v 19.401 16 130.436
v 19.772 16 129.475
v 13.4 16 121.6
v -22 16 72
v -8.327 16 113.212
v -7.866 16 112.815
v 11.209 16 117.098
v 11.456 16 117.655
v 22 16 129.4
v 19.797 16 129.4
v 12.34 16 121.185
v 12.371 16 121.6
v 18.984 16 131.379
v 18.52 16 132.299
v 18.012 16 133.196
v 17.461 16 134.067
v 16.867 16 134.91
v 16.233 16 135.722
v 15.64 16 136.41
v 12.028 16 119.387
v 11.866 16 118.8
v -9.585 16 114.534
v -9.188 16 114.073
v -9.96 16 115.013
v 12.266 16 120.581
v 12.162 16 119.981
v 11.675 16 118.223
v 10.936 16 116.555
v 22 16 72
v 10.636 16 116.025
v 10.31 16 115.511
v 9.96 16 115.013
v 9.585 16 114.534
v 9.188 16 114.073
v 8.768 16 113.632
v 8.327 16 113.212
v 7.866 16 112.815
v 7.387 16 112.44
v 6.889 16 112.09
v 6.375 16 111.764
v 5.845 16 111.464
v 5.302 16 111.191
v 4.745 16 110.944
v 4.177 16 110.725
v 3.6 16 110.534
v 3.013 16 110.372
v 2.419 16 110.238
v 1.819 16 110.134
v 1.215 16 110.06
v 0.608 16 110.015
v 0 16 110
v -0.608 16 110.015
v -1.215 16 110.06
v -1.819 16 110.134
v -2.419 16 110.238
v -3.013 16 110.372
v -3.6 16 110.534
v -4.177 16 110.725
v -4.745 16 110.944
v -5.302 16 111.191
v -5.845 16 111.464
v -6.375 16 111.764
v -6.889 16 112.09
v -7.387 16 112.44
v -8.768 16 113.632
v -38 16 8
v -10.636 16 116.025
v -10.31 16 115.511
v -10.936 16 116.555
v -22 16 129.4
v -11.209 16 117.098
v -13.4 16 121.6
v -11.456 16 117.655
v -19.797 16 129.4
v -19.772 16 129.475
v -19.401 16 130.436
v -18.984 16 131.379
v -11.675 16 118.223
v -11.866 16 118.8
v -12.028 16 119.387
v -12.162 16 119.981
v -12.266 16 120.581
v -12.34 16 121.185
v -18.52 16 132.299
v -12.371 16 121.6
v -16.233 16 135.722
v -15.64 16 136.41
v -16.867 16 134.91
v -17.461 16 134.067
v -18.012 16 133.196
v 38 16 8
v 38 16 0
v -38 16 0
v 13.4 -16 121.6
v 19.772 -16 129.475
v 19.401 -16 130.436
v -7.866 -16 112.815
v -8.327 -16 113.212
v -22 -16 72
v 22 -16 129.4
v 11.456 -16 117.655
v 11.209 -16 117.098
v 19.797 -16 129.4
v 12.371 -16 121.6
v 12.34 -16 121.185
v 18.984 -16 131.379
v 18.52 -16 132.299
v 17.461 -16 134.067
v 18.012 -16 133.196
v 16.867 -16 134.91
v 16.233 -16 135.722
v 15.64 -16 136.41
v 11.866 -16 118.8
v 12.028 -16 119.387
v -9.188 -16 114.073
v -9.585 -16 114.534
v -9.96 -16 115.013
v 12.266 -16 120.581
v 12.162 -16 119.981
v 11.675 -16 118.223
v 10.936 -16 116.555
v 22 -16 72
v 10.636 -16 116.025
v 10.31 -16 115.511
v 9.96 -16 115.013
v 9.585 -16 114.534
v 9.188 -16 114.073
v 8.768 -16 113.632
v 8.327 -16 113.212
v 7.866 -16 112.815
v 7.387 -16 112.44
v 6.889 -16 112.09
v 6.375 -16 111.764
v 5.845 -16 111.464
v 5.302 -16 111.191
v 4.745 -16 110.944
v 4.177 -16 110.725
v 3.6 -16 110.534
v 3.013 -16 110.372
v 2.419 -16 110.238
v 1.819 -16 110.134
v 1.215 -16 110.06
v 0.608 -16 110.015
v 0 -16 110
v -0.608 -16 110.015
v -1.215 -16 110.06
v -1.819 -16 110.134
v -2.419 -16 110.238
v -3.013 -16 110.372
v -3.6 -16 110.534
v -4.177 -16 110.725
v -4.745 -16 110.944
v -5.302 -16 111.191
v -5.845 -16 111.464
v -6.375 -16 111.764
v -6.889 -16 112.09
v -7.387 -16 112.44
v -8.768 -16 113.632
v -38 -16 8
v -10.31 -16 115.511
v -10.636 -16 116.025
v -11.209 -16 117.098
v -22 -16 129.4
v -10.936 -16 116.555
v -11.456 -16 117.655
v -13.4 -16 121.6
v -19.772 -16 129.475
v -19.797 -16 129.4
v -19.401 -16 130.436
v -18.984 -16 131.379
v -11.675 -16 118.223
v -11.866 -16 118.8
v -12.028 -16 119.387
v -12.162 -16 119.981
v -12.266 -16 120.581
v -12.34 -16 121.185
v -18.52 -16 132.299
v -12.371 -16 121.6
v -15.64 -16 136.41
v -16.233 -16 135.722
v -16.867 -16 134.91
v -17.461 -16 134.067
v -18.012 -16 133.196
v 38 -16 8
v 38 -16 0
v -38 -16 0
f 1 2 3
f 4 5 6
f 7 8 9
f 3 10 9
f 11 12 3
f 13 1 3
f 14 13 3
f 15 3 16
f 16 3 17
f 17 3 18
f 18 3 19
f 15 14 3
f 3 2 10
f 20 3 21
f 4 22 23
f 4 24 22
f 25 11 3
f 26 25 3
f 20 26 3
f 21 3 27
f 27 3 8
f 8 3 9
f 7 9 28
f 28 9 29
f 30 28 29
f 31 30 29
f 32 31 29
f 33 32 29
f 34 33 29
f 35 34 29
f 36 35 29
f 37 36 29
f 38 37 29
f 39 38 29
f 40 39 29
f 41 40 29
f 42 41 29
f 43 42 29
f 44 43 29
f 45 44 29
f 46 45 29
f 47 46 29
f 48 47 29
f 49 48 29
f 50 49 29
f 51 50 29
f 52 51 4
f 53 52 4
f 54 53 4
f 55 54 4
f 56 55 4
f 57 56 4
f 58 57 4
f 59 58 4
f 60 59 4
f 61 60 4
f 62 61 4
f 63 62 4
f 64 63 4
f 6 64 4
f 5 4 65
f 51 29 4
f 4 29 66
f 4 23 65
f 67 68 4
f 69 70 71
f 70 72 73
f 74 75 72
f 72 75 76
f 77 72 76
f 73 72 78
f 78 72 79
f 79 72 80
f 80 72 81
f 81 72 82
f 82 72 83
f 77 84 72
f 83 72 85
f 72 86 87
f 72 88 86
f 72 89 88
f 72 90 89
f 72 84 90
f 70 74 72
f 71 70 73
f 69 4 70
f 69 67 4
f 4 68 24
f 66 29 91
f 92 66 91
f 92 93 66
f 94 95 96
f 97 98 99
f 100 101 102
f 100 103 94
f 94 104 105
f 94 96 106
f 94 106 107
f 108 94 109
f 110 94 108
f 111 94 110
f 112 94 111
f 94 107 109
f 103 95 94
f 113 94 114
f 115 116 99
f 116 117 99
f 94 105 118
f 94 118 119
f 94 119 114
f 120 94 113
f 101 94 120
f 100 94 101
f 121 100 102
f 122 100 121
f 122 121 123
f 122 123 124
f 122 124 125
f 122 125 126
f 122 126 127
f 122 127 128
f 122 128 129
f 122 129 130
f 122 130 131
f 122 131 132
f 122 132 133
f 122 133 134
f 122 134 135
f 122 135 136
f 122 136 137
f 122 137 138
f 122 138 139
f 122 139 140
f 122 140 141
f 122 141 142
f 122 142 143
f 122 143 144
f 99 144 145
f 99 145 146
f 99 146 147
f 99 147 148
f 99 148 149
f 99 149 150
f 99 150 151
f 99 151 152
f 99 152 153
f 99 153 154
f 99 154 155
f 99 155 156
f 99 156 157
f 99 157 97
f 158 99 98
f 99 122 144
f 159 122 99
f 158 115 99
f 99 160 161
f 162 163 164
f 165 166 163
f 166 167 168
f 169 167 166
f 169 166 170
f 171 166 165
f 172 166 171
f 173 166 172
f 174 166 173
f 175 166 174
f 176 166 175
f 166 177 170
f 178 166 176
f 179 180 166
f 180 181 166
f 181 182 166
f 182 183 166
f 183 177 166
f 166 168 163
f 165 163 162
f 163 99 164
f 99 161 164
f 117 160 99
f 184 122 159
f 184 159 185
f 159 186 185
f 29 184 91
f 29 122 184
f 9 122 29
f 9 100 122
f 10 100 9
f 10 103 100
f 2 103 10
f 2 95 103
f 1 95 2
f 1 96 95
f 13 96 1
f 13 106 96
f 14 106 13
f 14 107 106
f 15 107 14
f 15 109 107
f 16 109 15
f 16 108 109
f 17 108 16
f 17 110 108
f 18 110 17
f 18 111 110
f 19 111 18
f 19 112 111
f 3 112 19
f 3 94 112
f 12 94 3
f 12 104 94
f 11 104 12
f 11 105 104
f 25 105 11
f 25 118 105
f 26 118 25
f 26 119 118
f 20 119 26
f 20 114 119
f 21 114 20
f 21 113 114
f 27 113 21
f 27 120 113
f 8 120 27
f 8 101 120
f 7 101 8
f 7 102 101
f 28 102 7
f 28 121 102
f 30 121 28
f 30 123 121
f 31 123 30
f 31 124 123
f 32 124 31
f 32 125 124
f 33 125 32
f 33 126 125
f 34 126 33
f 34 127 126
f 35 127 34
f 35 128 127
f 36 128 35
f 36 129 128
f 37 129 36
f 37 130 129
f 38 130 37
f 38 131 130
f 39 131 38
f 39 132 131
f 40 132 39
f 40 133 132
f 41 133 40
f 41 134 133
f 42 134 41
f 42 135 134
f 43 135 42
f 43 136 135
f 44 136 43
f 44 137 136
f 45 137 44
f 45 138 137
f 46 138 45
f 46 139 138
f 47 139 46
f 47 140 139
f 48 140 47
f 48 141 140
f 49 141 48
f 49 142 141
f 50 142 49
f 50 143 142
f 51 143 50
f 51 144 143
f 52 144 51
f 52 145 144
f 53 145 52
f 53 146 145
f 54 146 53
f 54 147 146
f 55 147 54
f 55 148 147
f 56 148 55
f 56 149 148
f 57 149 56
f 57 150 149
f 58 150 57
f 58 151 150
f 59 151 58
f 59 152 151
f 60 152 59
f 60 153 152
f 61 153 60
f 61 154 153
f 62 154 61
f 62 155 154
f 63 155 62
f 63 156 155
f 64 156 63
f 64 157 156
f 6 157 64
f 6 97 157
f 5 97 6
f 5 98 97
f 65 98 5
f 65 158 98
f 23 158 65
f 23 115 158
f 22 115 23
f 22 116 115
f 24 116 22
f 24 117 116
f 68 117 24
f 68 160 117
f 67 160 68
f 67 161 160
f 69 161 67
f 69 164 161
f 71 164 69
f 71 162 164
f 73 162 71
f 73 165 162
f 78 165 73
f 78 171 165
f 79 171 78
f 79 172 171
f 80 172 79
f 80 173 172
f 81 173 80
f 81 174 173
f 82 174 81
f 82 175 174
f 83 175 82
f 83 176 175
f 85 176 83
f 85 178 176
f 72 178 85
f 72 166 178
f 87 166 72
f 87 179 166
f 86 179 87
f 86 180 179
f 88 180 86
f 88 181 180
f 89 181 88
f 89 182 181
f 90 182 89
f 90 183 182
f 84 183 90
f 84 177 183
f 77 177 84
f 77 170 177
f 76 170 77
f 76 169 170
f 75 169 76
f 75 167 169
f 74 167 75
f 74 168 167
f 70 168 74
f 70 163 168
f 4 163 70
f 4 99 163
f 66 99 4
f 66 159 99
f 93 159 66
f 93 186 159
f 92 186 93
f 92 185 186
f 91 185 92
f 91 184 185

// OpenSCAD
// Bodenstehender Rohrhalter fuer eine Filament-Trockenbox
// Rohr-Aussendurchmesser: 23.5 mm
// Tiefster Auflagepunkt des Rohres: 110.0 mm ueber Boxboden
// Zweimal identisch drucken.

$fn = 128;

rohr_d = 23.5;
spiel_d = 1.3;
aufnahme_d = rohr_d + spiel_d;
auflage_hoehe = 110.0;
aufnahme_r = aufnahme_d/2;
achse_z = auflage_hoehe + aufnahme_r;

halter_tiefe = 32.0;
sockel_breite = 76.0;
sockel_dicke = 8.0;
steg_breite = 44.0;
kopf_r = 21.0;

ausschnitt_unten_halb = 13.4;
ausschnitt_oben_halb = 17.0;

module profil_2d() {
    difference() {
        union() {
            translate([-sockel_breite/2,0]) square([sockel_breite,sockel_dicke]);
            translate([-steg_breite/2,sockel_dicke]) square([steg_breite,achse_z+7-sockel_dicke]);
            polygon([[-sockel_breite/2,sockel_dicke],[-steg_breite/2,sockel_dicke],[-steg_breite/2,72.0]]);
            polygon([[steg_breite/2,sockel_dicke],[sockel_breite/2,sockel_dicke],[steg_breite/2,72.0]]);
            translate([0,achse_z]) circle(r=kopf_r);
        }
        translate([0,achse_z]) circle(d=aufnahme_d);
        polygon([
            [-ausschnitt_unten_halb,achse_z-0.8],
            [-ausschnitt_oben_halb,achse_z+kopf_r+2],
            [ ausschnitt_oben_halb,achse_z+kopf_r+2],
            [ ausschnitt_unten_halb,achse_z-0.8]
        ]);
    }
}

// Fuer den Druck liegt die grosse Seitenflaeche auf dem Druckbett.
rotate([90,0,0])
linear_extrude(height=halter_tiefe, center=true)
    profil_2d();
